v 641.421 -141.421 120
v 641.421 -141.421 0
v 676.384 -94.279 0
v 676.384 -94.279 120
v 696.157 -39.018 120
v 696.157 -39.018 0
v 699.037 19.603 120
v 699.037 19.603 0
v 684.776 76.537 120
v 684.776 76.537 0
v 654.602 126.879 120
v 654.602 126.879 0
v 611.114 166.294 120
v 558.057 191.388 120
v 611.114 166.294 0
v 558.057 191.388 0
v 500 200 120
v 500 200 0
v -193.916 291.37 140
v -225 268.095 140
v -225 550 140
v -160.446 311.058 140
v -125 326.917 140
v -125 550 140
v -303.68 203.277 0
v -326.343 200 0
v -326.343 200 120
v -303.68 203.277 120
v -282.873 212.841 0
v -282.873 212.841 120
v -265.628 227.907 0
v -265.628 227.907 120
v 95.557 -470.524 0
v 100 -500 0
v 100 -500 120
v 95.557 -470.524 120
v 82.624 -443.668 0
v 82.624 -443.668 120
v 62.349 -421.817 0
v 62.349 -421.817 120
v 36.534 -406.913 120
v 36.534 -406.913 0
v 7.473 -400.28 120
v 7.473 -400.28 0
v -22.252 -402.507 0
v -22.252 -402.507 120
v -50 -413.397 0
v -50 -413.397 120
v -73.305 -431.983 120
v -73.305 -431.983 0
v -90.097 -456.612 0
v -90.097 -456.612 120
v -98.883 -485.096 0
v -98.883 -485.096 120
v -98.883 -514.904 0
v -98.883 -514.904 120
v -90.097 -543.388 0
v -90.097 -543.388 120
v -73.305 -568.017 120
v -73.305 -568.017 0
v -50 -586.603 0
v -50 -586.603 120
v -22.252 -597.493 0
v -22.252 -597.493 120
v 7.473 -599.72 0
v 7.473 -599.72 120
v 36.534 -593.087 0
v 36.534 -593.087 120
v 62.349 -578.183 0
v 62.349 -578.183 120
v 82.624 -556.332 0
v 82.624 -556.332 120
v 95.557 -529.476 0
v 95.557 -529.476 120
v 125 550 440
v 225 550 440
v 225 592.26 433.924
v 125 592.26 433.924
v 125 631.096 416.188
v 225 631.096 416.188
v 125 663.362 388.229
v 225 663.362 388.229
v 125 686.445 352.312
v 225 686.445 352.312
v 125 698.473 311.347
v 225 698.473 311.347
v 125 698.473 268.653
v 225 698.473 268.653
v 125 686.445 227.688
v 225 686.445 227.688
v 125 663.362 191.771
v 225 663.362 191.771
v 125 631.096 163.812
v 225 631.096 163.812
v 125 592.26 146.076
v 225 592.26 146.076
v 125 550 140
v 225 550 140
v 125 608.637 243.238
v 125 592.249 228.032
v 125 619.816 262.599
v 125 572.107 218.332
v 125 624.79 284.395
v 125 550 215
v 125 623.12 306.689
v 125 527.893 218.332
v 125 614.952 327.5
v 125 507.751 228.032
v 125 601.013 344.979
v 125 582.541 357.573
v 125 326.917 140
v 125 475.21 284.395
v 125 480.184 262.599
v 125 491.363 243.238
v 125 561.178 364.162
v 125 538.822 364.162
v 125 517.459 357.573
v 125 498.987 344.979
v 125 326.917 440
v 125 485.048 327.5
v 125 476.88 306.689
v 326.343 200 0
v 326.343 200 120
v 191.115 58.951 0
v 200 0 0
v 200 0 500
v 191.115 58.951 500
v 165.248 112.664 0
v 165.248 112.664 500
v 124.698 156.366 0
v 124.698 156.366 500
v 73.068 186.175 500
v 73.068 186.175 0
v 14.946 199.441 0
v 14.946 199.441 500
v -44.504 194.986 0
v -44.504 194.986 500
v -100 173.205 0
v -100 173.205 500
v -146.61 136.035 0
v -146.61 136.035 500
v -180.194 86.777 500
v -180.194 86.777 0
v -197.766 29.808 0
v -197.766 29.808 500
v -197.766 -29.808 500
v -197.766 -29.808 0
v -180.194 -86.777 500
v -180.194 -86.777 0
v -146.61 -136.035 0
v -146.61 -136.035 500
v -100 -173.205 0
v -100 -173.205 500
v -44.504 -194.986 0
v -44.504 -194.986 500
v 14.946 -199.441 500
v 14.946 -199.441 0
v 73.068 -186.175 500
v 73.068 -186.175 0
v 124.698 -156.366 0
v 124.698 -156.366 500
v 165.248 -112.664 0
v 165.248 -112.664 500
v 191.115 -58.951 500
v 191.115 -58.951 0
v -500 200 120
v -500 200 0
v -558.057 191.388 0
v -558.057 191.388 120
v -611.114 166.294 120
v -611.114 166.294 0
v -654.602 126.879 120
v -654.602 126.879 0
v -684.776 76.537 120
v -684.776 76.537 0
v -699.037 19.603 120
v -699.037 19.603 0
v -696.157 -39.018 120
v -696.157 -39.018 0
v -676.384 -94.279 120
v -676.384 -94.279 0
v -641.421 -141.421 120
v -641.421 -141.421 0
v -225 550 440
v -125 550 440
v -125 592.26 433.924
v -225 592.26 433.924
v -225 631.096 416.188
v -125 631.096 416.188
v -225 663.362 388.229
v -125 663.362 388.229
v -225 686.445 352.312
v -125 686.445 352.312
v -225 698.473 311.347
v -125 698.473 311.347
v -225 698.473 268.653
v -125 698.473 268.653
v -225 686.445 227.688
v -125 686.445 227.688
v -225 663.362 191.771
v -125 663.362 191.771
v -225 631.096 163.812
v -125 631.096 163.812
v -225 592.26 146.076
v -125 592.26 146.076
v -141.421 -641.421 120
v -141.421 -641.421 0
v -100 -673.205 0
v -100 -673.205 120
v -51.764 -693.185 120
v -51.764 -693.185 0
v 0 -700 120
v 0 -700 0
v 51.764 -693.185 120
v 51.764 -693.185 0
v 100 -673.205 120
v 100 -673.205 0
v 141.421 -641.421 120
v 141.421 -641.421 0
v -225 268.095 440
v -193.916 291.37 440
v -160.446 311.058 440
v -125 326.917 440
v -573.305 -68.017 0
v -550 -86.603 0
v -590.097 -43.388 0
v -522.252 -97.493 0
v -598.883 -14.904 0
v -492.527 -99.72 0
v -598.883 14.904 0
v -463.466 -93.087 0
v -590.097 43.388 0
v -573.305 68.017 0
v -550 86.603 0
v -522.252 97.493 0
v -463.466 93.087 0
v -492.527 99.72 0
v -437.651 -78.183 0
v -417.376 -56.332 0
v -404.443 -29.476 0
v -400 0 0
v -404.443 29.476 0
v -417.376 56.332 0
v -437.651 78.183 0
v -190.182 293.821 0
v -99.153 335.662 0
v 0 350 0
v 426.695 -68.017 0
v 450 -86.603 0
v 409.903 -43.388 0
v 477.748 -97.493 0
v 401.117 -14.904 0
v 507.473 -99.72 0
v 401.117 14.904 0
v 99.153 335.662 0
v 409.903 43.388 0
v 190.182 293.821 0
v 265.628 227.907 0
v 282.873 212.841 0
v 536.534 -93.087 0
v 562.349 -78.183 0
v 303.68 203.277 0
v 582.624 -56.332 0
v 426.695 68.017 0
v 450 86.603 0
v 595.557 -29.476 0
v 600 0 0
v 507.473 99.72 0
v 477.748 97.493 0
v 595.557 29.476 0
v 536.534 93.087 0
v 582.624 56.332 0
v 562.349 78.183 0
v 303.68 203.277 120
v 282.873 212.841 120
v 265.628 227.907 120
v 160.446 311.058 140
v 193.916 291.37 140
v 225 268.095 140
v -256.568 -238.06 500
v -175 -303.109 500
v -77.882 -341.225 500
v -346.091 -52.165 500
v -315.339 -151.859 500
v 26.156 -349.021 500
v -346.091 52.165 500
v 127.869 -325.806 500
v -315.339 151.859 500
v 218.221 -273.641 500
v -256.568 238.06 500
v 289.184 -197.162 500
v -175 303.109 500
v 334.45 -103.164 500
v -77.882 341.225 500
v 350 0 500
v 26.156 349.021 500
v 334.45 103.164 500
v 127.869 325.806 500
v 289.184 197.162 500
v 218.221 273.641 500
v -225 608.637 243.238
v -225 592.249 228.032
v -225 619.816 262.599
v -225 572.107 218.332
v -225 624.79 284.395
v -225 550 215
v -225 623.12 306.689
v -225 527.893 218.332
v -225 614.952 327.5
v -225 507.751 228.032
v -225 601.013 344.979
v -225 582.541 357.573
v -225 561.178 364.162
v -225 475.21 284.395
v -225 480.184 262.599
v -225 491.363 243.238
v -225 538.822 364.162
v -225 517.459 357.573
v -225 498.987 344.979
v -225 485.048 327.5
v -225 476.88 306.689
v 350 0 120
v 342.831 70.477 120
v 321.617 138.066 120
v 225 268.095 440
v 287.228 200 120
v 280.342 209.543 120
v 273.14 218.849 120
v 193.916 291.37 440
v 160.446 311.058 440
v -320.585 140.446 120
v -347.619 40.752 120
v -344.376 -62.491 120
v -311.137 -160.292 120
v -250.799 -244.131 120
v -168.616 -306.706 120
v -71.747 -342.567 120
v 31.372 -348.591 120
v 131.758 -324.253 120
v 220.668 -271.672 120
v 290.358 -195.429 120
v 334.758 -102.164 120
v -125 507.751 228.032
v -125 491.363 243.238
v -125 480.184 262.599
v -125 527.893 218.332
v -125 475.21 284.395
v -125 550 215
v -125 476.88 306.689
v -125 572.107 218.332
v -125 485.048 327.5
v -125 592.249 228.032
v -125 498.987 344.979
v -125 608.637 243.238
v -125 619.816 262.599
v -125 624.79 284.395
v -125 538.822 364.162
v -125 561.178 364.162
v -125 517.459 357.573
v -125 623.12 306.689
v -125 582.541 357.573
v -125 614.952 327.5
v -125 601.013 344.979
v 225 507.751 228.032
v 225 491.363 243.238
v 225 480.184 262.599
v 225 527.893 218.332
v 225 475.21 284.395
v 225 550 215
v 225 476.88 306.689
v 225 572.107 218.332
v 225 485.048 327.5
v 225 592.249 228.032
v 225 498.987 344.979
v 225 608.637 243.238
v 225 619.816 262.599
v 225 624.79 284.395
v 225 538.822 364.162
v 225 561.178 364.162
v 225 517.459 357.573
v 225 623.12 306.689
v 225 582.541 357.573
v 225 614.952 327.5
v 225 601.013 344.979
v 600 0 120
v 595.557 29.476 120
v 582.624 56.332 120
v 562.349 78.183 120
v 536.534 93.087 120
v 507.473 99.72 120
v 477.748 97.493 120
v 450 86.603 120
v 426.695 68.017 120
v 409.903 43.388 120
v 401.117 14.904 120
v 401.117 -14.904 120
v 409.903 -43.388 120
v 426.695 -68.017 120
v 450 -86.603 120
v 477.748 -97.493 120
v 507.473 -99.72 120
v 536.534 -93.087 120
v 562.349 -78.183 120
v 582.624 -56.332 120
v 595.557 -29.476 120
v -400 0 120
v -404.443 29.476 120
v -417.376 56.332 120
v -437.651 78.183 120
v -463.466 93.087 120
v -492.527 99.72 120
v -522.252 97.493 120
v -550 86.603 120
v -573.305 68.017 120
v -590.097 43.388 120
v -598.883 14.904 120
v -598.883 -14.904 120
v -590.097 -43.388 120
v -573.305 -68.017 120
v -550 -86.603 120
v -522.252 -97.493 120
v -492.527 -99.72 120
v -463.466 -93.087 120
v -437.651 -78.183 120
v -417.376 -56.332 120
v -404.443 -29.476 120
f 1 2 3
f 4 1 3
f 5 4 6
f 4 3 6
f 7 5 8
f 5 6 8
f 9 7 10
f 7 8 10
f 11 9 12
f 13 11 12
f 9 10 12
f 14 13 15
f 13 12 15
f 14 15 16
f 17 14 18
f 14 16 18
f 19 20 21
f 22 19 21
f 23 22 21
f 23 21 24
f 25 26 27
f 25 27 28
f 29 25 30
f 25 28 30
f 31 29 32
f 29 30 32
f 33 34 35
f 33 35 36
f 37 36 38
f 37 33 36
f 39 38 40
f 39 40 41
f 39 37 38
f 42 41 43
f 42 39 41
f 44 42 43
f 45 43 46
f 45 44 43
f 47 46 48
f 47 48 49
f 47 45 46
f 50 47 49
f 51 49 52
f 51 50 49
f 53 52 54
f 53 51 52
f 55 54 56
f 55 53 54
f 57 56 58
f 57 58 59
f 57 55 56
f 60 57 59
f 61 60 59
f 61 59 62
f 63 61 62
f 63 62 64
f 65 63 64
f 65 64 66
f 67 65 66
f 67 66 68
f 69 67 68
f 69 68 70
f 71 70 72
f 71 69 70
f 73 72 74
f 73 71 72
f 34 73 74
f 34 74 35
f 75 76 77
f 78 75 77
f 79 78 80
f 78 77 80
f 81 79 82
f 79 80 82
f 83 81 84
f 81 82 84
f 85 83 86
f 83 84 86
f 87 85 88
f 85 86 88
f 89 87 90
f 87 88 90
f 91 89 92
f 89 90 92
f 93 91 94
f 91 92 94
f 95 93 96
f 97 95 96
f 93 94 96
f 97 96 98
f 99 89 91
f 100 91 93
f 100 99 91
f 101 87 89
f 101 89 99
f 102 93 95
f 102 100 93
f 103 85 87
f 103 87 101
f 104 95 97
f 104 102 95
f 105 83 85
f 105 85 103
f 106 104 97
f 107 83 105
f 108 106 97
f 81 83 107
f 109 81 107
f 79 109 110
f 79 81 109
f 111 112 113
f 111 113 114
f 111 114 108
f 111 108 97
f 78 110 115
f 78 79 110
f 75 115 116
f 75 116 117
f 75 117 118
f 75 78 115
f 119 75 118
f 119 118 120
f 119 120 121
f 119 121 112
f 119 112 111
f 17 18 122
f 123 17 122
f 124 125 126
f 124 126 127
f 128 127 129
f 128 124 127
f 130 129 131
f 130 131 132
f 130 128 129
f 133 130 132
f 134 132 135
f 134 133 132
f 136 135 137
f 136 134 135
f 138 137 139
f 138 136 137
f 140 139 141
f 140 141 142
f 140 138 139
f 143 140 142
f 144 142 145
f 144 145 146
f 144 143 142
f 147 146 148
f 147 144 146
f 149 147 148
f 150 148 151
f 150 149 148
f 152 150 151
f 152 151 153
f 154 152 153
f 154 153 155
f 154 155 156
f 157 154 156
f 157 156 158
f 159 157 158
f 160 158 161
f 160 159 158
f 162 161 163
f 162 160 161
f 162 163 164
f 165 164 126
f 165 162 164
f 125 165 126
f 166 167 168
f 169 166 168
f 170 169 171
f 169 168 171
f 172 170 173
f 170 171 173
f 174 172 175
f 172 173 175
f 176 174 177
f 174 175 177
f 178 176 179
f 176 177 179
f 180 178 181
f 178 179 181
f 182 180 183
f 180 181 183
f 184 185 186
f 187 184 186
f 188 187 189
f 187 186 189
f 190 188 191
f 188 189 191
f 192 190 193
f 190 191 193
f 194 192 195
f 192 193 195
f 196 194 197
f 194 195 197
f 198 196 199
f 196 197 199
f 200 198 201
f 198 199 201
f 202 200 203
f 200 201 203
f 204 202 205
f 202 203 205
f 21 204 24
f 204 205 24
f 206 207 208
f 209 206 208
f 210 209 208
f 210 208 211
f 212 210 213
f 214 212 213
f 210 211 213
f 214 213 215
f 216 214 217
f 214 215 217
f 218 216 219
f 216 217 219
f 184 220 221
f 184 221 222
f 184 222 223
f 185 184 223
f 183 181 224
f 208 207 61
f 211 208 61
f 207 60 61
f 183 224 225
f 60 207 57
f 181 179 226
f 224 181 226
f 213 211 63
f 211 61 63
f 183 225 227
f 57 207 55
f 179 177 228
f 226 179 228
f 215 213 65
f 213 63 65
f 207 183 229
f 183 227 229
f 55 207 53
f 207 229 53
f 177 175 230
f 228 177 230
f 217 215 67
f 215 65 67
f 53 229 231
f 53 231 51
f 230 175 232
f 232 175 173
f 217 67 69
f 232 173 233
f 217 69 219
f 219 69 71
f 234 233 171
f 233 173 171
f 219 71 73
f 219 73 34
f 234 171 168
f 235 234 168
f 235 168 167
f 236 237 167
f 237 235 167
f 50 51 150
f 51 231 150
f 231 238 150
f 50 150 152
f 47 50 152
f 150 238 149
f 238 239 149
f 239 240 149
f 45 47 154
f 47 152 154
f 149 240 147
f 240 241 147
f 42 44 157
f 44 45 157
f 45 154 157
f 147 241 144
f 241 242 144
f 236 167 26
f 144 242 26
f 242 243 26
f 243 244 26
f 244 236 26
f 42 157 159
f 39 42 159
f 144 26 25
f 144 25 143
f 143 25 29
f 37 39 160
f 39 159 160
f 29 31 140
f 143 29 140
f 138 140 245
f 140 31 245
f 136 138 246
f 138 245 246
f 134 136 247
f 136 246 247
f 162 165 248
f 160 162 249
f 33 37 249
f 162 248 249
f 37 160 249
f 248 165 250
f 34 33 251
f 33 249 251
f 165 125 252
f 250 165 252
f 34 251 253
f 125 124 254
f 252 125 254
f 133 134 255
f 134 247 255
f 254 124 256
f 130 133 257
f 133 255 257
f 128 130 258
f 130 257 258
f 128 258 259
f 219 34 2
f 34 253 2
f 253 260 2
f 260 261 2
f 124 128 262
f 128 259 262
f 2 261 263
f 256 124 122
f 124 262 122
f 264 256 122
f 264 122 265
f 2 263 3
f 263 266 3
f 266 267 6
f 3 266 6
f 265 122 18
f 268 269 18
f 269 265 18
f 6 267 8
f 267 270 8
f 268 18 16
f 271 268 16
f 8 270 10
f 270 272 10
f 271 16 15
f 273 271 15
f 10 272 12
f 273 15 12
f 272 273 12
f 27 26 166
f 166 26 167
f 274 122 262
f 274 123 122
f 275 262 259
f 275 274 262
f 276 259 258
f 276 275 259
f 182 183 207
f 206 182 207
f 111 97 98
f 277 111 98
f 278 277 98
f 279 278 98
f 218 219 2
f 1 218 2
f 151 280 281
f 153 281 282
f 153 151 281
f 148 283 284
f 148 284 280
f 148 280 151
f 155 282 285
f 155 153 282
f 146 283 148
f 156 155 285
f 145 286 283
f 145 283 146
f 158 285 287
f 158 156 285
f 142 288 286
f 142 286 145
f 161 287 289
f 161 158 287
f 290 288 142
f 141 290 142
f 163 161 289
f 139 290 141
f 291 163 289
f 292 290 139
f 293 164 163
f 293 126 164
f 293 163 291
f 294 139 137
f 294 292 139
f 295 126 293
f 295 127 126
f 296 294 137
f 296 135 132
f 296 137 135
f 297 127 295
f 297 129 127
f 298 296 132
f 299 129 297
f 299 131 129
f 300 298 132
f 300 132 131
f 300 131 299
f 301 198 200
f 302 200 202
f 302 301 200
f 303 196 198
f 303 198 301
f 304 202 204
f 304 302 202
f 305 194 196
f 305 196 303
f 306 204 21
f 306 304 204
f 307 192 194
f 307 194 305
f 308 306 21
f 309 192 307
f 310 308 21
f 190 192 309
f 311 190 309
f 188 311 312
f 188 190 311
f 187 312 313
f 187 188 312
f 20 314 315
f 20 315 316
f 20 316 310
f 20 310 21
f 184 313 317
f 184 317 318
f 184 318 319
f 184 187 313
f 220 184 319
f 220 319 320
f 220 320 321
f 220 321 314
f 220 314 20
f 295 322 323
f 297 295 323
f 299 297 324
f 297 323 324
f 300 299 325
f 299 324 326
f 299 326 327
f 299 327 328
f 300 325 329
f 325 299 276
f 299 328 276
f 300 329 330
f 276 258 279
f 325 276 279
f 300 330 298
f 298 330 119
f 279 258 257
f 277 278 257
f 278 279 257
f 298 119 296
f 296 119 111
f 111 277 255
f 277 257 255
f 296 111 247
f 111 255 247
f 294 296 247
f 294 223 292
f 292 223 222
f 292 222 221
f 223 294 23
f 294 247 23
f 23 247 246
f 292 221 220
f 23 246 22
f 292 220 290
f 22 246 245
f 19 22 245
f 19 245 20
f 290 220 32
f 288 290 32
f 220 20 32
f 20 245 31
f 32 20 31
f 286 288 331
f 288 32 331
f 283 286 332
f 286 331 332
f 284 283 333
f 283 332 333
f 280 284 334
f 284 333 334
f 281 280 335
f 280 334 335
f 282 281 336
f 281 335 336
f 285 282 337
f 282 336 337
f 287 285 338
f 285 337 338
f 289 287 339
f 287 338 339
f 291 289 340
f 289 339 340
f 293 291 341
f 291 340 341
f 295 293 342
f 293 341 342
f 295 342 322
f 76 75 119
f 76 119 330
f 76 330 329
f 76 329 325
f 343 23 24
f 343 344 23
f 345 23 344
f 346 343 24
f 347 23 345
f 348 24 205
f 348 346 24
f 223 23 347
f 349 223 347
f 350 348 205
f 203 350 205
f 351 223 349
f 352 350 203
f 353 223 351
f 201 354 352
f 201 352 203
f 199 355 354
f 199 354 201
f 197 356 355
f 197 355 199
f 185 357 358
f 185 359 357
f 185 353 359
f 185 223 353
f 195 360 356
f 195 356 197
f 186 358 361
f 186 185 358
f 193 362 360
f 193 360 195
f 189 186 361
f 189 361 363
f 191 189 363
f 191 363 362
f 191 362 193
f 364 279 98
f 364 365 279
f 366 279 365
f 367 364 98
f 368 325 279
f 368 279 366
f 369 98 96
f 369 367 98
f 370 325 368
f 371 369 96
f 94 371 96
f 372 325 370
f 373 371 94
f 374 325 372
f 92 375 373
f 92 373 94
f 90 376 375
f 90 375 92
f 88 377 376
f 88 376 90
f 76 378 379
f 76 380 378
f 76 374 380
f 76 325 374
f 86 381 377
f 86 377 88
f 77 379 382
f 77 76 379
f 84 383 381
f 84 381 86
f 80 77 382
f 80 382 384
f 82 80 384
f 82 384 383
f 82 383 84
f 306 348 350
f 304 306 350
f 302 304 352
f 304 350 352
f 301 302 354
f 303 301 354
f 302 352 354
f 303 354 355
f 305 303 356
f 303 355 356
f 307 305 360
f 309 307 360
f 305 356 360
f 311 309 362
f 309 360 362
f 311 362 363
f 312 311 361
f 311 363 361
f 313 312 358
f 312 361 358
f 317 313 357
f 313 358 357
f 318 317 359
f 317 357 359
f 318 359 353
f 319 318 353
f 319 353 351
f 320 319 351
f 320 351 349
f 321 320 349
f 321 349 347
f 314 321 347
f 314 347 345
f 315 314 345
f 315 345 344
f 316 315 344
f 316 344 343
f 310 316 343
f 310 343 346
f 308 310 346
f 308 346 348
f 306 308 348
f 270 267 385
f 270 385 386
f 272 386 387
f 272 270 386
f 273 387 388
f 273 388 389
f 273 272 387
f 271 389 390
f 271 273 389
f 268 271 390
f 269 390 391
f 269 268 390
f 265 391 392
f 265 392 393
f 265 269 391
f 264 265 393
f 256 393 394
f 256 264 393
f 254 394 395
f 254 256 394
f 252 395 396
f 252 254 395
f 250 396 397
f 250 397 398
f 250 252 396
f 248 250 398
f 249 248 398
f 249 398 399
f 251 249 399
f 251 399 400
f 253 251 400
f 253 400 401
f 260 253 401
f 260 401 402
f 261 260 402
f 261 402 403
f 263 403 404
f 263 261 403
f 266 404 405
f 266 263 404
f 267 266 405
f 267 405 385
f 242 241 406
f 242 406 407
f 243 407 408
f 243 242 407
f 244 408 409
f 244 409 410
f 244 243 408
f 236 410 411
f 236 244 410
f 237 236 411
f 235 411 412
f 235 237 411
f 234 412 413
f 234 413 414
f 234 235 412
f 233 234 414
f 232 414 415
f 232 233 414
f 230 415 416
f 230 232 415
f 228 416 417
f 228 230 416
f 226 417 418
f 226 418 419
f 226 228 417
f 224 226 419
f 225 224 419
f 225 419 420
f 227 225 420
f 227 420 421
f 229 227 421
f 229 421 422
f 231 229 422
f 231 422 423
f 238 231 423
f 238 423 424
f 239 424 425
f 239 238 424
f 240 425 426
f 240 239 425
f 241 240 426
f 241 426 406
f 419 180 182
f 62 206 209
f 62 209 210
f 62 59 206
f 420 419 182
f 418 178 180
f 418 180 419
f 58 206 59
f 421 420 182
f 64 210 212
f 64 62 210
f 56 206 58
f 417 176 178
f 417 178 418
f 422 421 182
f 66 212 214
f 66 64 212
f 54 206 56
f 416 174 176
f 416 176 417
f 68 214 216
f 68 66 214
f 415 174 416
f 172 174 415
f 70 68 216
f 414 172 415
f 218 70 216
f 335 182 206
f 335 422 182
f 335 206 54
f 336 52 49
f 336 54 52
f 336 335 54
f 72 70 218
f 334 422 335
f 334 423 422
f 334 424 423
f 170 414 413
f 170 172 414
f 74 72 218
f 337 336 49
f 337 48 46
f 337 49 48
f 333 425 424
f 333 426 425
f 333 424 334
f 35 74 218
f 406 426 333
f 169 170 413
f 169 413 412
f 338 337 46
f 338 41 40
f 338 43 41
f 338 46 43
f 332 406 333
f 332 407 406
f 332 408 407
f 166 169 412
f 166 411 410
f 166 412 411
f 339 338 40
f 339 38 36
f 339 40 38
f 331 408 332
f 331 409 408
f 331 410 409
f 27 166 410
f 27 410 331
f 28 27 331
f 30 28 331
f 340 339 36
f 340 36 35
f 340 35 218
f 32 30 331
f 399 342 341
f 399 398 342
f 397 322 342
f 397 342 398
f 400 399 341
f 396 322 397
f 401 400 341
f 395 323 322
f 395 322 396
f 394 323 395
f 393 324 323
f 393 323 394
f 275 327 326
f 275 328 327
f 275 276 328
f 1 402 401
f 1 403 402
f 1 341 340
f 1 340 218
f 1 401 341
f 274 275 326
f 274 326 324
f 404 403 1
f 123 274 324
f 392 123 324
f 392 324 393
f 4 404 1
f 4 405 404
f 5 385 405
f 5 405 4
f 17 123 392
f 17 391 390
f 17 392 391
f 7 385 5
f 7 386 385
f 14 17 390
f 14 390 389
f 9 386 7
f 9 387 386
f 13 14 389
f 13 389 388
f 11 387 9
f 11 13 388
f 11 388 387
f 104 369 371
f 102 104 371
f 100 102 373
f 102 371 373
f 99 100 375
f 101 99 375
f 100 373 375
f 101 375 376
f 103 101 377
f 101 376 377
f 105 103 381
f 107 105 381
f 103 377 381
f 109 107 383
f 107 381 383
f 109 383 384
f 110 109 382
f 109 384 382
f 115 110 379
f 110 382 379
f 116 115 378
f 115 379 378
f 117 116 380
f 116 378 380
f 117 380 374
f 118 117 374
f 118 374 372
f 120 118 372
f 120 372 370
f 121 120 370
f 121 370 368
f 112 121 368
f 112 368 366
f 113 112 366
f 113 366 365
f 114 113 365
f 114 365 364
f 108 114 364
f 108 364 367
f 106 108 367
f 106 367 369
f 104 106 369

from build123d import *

# Parameters (mm, degrees)
SKETCH1_R           = 350
SKETCH1_R_2         = 200
BOSS_EXTRUDE1_DEPTH = 500
SKETCH2_R           = 100
BOSS_EXTRUDE2_DEPTH = 120
FILLET1_R           = 80
BOSS_EXTRUDE3_START = -60
BOSS_EXTRUDE3_DEPTH = 300
SKETCH4_R           = 75
CUT_EXTRUDE2_DEPTH  = 450


with BuildPart() as part:
    # Sketch1 → Boss-Extrude1 (new body)
    with BuildSketch(Plane.XY):
        Circle(SKETCH1_R)
        Circle(SKETCH1_R_2, mode=Mode.SUBTRACT)
    extrude(amount=BOSS_EXTRUDE1_DEPTH)

    # Sketch2 → Boss-Extrude2 (add)
    with BuildSketch(Plane.XY):
        with BuildLine():
            ThreePointArc((-141.421356237, -641.421356237), (0, -700), (141.421356237, -641.421356237))
            Line((141.421356237, -641.421356237), (641.421356237, -141.421356237))
            ThreePointArc((641.421356237, -141.421356237), (684.775906502, 76.536686473), (500, 200))
            Line((500, 200), (287.228132327, 200))
            ThreePointArc((287.228132327, 200), (333.938502059, 104.809717311), (350, 0))
            ThreePointArc((350, 0), (-104.809717311, -333.938502059), (-287.228132327, 200))
            Line((-287.228132327, 200), (-500, 200))
            ThreePointArc((-500, 200), (-684.775906502, 76.536686473), (-641.421356237, -141.421356237))
            Line((-641.421356237, -141.421356237), (-141.421356237, -641.421356237))
        make_face()
        with Locations((0, -500)):
            Circle(SKETCH2_R, mode=Mode.SUBTRACT)
        with Locations((-500, 0)):
            Circle(SKETCH2_R, mode=Mode.SUBTRACT)
        with Locations((500, 0)):
            Circle(SKETCH2_R, mode=Mode.SUBTRACT)
    extrude(amount=BOSS_EXTRUDE2_DEPTH)

    # Fillet1
    fillet1_edges = [part.edges().sort_by_distance(p)[0] for p in [
        (287.228132327, 200, 60),
        (-287.228132327, 200, 60),
    ]]
    fillet(fillet1_edges, radius=FILLET1_R)

    # Sketch3 → Boss-Extrude3 (add)
    with BuildSketch(Plane.XY.offset(500).offset(BOSS_EXTRUDE3_START)):
        with BuildLine():
            Line((225, 700), (125, 700))
            Line((125, 700), (125, 326.917420766))
            ThreePointArc((125, 326.917420766), (177.454262848, 301.678611434), (225, 268.095132369))
            Line((225, 268.095132369), (225, 700))
        make_face()
        with BuildLine():
            Line((-225, 700), (-225, 268.095132369))
            ThreePointArc((-225, 268.095132369), (-177.454262848, 301.678611434), (-125, 326.917420766))
            Line((-125, 326.917420766), (-125, 700))
            Line((-125, 700), (-225, 700))
        make_face()
    extrude(amount=-BOSS_EXTRUDE3_DEPTH)

    # Sketch4 → Cut-Extrude2 (cut)
    with BuildSketch(Plane(origin=(225, 0, 0), x_dir=(0, 0, -1), z_dir=(1, 0, 0))):
        with BuildLine():
            ThreePointArc((-440, 550), (-396.066017178, 656.066017178), (-290, 700))
            Line((-290, 700), (-440, 700))
            Line((-440, 700), (-440, 550))
        make_face()
        with BuildLine():
            ThreePointArc((-290, 700), (-183.933982822, 656.066017178), (-140, 550))
            Line((-140, 550), (-140, 700))
            Line((-140, 700), (-290, 700))
        make_face()
        with Locations((-290, 550)):
            Circle(SKETCH4_R)
    extrude(amount=-CUT_EXTRUDE2_DEPTH, mode=Mode.SUBTRACT)


solid = part.part
